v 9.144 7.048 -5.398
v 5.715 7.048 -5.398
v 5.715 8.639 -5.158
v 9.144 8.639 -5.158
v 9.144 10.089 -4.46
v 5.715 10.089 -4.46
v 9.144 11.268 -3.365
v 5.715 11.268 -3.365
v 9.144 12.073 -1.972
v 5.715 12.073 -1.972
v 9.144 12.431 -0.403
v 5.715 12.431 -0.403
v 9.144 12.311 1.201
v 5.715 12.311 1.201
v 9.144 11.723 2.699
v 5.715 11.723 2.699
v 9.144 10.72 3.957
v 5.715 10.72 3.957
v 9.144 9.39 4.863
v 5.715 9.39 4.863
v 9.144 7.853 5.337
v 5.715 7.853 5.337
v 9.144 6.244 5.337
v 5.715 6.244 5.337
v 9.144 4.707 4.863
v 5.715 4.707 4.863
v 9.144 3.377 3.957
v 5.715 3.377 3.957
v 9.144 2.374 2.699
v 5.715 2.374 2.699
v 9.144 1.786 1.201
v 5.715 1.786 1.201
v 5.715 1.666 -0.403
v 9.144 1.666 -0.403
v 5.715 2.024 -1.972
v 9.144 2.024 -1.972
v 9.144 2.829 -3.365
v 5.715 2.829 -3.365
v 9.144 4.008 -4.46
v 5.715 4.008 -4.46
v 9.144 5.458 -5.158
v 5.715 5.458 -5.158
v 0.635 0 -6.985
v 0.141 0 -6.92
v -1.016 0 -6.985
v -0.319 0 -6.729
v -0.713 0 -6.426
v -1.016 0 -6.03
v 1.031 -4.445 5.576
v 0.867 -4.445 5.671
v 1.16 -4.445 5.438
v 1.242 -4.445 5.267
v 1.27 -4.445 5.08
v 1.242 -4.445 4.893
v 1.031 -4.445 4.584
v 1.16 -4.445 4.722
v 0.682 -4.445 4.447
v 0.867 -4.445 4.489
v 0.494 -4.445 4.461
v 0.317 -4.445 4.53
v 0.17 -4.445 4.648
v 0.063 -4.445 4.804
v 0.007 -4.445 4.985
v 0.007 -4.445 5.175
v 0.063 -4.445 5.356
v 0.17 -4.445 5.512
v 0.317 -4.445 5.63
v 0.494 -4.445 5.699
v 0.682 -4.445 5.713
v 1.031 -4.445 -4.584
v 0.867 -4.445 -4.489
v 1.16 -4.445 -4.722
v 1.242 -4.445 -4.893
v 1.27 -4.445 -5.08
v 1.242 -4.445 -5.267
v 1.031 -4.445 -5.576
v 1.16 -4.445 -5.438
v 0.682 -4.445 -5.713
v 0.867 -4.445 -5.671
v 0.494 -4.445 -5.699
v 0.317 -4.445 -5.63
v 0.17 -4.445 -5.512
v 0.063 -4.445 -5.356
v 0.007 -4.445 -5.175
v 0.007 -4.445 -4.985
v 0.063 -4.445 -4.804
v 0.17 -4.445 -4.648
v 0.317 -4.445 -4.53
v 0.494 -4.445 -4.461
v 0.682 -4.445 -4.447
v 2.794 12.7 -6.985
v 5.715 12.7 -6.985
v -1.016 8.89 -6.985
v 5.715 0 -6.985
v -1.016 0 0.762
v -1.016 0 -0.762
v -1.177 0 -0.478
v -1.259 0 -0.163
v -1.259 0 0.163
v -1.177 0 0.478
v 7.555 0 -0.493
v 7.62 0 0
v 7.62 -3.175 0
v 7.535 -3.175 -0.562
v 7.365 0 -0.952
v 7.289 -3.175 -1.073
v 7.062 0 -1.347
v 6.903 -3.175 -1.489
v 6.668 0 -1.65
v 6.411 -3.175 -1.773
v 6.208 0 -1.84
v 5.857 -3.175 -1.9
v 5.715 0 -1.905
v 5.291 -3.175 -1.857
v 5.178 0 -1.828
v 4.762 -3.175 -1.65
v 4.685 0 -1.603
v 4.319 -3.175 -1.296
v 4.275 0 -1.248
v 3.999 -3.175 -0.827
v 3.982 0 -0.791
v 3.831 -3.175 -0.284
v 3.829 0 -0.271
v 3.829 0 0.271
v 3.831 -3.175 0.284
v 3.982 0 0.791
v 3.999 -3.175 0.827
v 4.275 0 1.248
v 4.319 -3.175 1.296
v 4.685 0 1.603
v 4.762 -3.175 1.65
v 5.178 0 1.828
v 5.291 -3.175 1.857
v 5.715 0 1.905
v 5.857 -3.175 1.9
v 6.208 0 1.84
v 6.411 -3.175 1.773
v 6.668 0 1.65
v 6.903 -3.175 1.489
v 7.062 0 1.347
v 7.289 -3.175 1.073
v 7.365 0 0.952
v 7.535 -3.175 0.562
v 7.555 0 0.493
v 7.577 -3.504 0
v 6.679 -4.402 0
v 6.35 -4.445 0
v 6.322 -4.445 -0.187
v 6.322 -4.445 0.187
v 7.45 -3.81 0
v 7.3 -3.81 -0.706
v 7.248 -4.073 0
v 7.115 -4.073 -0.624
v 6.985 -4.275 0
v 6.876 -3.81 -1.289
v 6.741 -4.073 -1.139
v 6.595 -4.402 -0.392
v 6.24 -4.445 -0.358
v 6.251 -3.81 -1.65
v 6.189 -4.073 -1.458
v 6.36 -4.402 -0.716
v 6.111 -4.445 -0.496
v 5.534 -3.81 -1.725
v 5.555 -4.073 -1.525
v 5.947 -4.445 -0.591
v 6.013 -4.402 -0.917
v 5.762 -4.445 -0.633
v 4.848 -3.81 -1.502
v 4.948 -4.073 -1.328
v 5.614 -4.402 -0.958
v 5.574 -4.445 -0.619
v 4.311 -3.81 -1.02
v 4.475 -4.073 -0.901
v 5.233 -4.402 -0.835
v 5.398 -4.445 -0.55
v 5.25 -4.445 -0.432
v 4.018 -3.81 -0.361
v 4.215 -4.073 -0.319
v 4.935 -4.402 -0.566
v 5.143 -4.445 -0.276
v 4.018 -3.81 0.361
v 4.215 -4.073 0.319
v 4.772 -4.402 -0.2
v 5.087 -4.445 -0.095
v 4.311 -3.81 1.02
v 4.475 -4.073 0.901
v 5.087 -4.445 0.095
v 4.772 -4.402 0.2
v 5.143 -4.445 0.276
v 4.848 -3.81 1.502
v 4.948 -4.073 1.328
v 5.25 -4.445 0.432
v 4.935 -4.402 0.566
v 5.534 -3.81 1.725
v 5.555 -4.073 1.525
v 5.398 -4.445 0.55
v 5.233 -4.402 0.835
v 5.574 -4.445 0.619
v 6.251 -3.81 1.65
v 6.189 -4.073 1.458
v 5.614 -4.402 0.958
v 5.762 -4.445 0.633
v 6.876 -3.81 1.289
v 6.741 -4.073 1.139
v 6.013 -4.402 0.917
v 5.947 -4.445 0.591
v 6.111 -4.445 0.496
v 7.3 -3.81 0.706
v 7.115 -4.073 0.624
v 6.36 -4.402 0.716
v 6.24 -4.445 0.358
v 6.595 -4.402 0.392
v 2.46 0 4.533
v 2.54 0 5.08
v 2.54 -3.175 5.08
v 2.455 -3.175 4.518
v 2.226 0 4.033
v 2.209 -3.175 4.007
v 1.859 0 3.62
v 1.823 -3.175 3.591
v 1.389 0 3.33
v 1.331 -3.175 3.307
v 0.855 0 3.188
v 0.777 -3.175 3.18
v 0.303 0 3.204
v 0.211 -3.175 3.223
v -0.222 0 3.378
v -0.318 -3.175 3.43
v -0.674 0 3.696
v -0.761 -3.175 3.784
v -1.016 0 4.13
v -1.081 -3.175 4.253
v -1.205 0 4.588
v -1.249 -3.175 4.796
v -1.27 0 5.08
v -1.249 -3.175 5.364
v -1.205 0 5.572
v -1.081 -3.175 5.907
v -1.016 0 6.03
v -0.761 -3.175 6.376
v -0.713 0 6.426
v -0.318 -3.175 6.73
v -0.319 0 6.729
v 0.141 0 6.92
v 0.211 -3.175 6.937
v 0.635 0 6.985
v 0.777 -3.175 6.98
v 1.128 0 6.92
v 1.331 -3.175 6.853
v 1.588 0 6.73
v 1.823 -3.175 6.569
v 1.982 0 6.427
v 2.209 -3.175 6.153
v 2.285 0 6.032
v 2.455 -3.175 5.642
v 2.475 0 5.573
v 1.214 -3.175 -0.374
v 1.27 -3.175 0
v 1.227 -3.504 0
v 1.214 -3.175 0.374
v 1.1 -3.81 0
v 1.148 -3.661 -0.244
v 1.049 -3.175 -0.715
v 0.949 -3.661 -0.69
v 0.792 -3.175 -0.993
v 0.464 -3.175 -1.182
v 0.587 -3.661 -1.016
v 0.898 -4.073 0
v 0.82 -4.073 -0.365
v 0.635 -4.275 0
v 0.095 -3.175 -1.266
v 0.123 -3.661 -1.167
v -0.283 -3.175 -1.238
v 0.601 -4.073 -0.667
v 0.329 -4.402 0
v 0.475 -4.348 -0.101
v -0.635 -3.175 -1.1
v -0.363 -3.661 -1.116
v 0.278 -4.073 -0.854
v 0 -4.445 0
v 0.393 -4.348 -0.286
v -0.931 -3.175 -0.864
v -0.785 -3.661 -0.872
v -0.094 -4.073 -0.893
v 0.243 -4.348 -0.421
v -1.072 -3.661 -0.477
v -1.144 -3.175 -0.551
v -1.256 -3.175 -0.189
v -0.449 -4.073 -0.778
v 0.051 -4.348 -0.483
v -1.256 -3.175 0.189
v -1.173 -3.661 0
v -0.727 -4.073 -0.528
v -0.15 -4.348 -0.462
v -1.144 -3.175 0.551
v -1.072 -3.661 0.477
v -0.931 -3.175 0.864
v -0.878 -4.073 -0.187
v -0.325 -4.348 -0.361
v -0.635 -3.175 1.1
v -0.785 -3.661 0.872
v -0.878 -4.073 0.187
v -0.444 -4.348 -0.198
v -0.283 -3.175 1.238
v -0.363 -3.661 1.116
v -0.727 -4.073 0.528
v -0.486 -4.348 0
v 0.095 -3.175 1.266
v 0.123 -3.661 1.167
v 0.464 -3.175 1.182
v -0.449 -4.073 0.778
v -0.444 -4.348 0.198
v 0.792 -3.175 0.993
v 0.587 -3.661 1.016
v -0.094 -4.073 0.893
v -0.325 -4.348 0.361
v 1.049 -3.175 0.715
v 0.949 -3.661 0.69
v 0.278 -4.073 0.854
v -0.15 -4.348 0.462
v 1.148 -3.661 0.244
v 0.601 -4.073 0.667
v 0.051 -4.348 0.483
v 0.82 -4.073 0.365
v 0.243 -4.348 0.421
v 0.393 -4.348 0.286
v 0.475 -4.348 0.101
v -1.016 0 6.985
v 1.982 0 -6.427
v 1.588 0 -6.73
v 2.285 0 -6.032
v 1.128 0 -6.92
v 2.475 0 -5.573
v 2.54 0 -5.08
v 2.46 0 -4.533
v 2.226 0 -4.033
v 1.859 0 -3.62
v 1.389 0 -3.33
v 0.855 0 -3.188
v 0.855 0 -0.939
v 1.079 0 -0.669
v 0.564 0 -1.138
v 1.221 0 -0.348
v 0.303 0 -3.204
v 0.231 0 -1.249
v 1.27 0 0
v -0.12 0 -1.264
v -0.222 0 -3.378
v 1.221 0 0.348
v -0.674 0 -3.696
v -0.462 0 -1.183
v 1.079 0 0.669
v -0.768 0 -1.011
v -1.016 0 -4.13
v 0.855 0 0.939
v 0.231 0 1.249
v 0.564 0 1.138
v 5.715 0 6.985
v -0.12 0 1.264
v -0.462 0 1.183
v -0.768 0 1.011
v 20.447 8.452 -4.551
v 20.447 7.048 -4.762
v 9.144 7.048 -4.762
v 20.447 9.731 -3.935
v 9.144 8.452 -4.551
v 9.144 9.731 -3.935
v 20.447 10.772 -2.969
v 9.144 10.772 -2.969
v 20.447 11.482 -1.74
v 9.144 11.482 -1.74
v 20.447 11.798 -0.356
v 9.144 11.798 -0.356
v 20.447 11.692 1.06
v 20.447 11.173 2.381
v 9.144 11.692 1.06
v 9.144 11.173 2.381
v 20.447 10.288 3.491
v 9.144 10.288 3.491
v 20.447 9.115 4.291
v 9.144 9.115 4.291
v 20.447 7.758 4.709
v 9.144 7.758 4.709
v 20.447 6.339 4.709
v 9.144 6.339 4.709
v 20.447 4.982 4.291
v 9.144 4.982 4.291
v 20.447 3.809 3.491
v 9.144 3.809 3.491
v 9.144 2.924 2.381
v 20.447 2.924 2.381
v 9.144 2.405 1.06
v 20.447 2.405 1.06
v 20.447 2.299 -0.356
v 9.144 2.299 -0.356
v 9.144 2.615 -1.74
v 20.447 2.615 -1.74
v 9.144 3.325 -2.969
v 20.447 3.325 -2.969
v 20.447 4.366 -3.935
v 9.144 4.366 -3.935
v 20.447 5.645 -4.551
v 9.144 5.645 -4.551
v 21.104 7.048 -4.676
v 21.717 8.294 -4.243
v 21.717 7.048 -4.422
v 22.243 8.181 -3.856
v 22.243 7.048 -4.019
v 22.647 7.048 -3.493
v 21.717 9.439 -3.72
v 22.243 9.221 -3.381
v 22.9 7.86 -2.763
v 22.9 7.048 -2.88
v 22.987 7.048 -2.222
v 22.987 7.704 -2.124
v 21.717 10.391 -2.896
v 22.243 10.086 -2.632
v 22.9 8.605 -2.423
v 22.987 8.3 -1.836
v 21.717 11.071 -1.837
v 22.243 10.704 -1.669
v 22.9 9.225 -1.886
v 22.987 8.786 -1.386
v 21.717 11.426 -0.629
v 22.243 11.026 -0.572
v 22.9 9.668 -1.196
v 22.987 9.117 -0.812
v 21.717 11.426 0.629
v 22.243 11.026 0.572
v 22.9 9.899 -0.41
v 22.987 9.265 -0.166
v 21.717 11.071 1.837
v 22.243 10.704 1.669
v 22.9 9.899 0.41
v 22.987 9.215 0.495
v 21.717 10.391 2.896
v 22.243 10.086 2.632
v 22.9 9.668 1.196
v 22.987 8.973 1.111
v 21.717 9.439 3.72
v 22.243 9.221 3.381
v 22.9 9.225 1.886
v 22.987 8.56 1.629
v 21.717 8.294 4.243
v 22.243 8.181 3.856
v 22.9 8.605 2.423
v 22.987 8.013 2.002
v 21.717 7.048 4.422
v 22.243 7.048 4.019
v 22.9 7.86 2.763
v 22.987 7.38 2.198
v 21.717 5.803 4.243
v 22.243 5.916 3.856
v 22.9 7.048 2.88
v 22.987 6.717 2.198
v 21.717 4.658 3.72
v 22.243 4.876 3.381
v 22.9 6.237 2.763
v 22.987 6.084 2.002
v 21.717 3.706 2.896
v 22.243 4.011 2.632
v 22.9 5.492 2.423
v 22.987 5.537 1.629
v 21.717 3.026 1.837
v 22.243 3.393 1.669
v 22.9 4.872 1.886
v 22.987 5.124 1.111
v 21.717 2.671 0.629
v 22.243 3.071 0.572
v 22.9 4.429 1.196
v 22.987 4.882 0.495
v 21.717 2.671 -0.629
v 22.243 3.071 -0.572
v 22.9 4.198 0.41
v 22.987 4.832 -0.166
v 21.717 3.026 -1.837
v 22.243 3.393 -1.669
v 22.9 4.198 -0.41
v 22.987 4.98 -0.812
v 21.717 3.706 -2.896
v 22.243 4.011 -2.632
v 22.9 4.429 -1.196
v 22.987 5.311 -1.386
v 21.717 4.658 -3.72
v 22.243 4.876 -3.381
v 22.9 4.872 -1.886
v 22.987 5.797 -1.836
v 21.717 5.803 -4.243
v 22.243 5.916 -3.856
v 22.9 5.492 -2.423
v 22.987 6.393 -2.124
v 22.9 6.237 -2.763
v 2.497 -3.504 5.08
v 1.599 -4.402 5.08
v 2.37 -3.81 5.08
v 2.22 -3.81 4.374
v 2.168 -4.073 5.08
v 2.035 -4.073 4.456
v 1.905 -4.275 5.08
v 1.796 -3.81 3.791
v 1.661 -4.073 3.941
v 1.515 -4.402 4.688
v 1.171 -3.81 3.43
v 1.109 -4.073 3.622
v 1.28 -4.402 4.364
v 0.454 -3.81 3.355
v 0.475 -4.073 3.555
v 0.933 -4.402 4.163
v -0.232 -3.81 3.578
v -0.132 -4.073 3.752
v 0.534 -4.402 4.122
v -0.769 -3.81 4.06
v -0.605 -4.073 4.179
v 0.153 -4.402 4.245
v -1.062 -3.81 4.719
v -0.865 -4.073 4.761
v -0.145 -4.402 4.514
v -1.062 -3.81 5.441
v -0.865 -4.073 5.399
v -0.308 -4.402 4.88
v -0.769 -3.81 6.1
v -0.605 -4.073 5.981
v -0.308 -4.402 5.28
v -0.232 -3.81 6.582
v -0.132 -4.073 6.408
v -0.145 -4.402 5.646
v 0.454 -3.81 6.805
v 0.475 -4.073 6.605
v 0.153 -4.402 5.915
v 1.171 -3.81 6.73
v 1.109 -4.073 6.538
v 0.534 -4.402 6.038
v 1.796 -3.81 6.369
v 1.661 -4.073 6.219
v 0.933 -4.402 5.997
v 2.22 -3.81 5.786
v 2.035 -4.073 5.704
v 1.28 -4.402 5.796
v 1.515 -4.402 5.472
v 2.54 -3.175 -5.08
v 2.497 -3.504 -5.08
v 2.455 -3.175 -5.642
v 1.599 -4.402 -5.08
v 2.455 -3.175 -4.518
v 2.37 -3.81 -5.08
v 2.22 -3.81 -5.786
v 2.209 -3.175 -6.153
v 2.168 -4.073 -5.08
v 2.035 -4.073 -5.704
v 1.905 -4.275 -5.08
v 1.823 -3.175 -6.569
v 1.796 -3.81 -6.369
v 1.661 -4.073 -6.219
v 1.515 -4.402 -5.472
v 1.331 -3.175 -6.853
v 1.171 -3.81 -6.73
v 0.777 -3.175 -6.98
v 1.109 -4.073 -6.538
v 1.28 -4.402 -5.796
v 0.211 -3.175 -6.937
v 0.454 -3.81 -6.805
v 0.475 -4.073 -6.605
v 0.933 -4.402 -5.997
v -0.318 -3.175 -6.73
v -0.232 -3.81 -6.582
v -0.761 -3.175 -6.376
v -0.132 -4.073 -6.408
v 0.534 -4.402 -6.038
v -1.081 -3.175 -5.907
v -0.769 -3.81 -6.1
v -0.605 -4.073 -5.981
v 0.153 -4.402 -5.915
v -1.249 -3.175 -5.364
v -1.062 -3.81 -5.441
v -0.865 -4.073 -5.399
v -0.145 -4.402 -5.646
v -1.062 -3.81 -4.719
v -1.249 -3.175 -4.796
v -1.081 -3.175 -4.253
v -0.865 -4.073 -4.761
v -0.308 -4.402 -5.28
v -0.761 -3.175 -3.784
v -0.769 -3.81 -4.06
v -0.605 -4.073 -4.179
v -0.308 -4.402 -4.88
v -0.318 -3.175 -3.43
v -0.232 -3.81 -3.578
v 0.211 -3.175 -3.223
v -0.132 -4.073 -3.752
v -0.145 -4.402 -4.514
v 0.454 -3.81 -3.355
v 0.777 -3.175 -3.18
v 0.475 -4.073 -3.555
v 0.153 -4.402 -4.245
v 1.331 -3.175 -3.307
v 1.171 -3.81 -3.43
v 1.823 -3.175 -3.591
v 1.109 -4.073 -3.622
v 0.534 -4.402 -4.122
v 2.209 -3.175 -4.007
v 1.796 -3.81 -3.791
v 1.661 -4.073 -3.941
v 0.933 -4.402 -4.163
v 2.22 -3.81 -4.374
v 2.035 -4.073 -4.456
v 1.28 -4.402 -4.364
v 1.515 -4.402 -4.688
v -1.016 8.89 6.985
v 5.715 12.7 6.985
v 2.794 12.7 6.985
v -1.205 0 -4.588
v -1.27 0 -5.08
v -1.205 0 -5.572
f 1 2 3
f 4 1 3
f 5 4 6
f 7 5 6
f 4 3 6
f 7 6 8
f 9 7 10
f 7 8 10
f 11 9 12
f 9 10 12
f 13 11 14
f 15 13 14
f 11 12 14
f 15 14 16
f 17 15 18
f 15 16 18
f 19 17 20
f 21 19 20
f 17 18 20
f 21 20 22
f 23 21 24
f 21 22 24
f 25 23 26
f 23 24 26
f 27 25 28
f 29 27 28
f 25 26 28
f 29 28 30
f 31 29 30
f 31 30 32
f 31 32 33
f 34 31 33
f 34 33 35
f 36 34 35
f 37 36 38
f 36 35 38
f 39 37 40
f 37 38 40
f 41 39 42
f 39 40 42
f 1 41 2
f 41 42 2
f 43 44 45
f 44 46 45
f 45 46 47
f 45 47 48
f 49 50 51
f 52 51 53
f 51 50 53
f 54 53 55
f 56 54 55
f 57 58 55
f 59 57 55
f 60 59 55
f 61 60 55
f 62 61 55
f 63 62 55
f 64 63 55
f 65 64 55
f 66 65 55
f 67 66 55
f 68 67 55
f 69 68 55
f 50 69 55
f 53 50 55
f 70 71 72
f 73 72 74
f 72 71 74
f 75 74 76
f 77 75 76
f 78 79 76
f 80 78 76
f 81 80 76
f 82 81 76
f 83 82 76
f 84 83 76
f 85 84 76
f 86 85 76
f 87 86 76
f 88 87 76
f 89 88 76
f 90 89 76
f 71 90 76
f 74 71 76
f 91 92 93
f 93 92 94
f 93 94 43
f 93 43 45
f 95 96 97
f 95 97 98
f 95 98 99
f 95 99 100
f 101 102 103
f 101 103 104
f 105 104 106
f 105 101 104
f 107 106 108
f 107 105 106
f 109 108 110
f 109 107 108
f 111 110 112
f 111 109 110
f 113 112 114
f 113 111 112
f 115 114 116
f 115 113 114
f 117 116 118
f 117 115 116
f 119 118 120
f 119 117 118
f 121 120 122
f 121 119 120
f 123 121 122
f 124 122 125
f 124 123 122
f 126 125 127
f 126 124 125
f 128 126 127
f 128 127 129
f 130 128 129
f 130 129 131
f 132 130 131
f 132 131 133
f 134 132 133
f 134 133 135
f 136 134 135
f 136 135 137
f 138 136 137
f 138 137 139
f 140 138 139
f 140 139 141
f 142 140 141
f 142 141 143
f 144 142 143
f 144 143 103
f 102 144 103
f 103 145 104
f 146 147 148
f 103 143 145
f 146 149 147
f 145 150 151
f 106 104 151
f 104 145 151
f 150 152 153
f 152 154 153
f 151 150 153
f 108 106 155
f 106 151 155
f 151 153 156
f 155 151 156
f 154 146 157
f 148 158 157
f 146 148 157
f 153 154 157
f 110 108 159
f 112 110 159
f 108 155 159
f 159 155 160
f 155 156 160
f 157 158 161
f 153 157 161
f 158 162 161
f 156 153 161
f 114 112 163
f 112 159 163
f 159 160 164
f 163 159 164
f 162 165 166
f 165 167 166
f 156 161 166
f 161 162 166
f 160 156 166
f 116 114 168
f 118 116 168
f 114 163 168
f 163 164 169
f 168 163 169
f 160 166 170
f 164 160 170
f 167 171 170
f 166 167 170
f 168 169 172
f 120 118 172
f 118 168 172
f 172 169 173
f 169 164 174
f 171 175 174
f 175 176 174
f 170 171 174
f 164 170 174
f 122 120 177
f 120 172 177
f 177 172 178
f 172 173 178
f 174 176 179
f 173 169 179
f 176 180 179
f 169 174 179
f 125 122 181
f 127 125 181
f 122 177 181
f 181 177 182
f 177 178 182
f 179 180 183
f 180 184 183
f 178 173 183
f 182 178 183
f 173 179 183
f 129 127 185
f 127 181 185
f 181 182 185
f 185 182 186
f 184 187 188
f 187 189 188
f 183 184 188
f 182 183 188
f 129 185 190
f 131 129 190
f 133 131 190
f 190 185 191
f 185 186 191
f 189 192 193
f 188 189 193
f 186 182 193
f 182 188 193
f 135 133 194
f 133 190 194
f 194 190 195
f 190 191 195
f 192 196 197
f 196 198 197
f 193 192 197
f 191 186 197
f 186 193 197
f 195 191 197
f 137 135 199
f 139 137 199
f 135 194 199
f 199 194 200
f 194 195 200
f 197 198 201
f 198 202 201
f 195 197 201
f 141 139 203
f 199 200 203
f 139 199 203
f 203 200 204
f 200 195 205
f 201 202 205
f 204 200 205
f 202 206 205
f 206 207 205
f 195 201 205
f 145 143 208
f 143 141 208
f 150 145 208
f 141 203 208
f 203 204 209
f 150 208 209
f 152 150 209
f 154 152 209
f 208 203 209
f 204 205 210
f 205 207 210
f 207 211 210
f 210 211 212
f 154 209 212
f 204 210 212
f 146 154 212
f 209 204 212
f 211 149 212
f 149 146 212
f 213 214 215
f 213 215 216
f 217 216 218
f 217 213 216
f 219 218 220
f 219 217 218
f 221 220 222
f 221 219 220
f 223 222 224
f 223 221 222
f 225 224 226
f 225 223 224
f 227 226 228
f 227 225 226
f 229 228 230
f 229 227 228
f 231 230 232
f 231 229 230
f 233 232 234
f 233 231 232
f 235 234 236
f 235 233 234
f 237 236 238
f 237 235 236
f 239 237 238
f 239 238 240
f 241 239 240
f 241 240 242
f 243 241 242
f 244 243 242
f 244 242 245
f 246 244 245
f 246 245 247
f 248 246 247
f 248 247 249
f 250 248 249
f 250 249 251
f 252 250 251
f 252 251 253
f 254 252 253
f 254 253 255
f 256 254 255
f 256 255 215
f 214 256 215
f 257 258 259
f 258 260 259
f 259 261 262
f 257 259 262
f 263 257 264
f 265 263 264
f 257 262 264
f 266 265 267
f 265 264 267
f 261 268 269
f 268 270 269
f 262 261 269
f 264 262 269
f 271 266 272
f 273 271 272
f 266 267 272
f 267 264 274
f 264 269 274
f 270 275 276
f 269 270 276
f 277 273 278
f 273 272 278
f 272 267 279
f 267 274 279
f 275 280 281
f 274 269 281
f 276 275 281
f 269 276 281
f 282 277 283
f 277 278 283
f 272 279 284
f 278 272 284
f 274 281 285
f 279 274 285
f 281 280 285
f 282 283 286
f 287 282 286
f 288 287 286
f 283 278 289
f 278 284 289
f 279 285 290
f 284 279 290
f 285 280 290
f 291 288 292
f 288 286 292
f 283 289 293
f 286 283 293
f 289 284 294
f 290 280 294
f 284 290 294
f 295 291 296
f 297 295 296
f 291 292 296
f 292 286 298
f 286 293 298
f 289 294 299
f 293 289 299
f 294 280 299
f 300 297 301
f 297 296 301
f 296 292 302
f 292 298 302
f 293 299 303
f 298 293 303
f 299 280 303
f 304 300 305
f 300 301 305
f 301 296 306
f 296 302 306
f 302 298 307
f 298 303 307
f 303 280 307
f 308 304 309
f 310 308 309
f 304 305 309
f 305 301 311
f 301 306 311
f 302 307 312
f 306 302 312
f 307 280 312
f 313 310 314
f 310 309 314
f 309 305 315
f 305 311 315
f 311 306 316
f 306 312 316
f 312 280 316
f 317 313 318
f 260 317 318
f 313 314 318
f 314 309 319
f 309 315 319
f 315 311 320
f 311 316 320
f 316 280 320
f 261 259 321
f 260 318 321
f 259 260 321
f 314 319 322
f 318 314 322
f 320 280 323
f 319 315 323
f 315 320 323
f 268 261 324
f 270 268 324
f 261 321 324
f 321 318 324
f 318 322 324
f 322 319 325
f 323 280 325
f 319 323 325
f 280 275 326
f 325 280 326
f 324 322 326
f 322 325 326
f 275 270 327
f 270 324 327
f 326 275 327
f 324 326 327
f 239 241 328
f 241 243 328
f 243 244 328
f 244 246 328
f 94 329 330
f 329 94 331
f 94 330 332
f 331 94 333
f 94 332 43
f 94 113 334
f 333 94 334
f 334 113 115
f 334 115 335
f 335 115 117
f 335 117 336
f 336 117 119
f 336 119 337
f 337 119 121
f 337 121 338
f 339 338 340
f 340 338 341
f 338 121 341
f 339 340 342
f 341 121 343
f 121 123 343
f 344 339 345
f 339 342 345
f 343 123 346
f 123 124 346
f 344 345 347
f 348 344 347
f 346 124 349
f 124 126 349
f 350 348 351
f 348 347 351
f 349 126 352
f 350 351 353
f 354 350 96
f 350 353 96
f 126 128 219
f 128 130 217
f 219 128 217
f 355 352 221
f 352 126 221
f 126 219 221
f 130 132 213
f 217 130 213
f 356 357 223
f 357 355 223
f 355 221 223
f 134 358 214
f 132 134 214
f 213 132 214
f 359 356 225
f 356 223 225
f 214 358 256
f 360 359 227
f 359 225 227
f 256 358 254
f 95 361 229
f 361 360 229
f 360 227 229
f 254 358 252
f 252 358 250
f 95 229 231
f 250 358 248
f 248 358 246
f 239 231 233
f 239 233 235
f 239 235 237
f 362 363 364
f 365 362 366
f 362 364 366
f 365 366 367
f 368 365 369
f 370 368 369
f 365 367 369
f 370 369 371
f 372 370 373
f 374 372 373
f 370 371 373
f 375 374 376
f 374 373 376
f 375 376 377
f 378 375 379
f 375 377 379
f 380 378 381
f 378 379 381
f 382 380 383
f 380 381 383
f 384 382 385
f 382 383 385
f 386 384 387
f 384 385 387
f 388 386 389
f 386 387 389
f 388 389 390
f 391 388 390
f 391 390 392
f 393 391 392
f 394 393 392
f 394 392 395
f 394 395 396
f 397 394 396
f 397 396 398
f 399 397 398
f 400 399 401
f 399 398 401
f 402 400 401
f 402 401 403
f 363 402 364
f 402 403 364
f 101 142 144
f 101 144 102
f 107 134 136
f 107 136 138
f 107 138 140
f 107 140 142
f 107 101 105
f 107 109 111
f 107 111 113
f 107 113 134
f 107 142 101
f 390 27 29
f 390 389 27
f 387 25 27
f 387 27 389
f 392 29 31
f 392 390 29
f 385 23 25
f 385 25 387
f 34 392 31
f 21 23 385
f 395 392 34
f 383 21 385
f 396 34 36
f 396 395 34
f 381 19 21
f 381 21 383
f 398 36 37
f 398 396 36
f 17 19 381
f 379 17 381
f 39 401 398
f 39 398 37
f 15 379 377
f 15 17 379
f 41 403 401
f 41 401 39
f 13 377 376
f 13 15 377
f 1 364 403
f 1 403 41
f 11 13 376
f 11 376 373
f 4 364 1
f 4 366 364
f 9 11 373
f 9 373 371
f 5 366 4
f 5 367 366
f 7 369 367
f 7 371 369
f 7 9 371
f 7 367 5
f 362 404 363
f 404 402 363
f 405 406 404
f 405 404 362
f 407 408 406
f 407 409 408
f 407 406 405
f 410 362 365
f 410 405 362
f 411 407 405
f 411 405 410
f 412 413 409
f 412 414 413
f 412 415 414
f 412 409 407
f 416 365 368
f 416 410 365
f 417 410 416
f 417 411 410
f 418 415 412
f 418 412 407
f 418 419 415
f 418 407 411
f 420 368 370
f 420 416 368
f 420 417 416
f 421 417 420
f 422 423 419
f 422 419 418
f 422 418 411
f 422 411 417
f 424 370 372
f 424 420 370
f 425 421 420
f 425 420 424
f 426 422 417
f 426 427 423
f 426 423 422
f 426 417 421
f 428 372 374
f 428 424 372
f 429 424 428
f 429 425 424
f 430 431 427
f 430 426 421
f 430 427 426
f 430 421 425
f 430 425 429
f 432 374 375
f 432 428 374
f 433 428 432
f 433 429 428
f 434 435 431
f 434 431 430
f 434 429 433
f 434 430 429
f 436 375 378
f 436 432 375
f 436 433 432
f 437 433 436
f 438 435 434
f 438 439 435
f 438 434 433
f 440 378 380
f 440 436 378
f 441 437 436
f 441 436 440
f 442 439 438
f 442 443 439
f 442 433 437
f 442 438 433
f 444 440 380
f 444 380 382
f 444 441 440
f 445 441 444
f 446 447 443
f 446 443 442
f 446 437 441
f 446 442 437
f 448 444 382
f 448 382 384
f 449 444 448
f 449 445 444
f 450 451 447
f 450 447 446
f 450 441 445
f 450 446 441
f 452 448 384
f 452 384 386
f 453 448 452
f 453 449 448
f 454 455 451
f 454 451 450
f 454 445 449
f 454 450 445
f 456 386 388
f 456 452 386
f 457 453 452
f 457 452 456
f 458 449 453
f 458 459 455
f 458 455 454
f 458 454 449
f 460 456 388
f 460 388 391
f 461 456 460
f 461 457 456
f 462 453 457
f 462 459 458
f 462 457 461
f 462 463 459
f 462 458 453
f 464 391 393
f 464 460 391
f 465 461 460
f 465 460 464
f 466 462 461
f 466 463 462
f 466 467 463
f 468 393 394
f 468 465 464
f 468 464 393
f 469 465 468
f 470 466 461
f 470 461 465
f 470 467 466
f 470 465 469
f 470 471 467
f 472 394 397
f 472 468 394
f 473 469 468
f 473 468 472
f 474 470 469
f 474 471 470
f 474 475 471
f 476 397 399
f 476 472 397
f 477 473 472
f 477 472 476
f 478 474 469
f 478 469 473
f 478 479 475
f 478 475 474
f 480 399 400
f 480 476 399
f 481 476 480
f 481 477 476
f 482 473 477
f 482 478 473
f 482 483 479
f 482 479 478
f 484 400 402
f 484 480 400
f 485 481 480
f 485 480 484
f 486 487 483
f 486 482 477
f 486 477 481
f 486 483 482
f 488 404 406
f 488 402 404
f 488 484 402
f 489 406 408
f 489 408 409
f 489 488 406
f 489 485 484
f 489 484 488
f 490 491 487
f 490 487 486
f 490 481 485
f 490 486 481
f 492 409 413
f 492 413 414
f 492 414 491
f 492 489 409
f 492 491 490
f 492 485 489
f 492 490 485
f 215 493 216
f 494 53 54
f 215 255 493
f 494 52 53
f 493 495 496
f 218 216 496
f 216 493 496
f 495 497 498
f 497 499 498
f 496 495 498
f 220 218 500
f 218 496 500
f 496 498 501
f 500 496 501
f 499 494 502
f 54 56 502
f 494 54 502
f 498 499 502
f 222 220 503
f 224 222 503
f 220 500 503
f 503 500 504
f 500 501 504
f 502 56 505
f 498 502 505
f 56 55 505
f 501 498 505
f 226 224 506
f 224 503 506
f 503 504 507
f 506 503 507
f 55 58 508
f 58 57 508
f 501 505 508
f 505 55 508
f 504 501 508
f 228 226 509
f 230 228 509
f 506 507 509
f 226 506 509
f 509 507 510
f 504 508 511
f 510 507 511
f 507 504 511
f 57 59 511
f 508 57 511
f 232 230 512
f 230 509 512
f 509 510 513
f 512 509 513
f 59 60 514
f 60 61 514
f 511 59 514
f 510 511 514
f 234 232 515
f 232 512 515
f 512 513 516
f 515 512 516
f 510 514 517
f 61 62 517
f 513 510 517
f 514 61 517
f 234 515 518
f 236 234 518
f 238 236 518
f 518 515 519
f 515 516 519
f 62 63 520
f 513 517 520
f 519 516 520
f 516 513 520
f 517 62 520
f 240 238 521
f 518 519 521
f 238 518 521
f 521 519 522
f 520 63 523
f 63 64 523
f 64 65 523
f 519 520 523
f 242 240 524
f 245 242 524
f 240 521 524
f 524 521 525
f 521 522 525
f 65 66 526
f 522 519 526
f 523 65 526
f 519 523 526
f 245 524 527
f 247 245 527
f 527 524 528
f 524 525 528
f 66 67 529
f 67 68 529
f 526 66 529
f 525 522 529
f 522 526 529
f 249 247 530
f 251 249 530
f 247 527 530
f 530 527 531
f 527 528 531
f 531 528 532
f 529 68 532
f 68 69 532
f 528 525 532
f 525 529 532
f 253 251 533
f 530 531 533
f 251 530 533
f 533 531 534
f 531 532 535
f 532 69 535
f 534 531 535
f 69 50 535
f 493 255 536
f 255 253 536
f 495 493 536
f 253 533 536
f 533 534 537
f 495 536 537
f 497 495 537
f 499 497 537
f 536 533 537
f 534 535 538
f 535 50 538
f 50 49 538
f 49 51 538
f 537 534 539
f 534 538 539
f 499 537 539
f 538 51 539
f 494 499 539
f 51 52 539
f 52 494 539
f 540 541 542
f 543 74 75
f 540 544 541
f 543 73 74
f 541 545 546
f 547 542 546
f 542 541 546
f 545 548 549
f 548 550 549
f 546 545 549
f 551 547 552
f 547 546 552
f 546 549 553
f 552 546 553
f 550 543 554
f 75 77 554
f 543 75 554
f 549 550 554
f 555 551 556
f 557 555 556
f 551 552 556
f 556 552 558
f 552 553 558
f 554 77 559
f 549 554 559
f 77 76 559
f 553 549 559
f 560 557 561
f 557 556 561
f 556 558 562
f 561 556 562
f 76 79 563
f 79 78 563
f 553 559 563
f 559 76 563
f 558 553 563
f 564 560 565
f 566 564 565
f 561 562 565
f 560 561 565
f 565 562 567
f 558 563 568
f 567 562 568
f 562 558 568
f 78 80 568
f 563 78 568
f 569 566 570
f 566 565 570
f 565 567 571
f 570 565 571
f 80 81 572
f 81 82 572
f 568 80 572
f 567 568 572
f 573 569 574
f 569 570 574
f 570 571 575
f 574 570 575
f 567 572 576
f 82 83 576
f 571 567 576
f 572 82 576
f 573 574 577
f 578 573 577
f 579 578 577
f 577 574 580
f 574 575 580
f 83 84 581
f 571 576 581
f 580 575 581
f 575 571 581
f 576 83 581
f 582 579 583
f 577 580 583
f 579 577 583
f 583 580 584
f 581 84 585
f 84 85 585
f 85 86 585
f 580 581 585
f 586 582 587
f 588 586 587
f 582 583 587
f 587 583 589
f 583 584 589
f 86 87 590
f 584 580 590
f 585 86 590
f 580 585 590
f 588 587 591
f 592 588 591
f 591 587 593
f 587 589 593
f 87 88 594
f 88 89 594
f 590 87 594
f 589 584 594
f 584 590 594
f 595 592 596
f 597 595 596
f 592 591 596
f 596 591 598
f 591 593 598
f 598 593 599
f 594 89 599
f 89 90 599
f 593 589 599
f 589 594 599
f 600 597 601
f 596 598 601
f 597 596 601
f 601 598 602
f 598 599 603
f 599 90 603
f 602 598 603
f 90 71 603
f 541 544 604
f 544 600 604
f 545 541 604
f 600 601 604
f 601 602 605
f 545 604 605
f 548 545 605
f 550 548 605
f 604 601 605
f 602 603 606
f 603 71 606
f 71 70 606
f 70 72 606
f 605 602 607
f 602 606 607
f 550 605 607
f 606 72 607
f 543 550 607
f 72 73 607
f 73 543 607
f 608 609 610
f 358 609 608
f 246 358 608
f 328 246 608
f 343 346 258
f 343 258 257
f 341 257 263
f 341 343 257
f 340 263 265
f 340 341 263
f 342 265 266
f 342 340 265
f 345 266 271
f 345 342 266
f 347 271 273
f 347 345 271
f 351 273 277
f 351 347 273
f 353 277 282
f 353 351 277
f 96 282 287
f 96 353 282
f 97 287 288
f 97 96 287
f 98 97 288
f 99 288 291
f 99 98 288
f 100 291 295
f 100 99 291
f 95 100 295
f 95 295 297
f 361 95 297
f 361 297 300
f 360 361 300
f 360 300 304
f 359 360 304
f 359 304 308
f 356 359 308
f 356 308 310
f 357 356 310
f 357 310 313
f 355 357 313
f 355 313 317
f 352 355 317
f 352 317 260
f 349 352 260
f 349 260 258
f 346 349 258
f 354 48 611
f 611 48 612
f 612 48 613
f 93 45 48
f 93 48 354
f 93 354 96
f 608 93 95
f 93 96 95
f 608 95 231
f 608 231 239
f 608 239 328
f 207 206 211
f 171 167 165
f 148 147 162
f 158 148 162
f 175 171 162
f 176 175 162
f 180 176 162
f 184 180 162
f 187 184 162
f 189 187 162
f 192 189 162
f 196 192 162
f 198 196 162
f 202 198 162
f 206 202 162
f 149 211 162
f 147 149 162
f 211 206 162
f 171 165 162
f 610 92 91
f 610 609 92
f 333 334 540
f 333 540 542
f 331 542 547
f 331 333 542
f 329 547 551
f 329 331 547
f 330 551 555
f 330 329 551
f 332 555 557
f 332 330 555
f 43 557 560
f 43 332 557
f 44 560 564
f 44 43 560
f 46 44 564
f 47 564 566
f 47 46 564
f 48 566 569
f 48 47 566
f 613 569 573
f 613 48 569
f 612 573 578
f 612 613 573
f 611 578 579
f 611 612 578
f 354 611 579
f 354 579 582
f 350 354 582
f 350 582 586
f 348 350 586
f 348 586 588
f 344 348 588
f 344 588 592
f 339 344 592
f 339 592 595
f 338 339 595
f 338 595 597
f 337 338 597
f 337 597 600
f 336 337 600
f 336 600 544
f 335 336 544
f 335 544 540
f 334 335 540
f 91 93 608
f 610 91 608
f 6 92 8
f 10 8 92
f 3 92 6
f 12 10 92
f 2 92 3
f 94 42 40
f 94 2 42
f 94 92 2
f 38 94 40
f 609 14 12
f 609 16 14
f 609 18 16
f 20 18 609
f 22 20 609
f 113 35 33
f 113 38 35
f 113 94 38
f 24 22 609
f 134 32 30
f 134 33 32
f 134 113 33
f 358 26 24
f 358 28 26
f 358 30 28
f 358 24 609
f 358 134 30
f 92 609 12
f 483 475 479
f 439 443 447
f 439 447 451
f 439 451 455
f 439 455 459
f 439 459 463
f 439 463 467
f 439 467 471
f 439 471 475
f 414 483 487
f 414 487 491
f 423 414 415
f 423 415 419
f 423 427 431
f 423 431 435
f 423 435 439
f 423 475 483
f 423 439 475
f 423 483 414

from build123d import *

# Parameters (mm, degrees)
SKETCH1_R             = 1.905
BOSS_EXTRUDE1_DEPTH   = 4.445
BOSS_EXTRUDE1_2_DEPTH = 4.445
BOSS_EXTRUDE1_3_DEPTH = 4.445
SKETCH1_R_2           = 1.27
BOSS_EXTRUDE1_4_DEPTH = 4.445
SKETCH2_W             = 6.731
SKETCH2_H             = 13.97
BOSS_EXTRUDE2_DEPTH   = 12.7
CHAMFER1_SIZE         = 3.81
SKETCH3_R             = 5.3975
BOSS_EXTRUDE3_DEPTH   = 3.429
SKETCH4_R             = 4.7625
BOSS_EXTRUDE4_DEPTH   = 13.843
FILLET1_R             = 2.54
FILLET2_R             = 1.27


with BuildPart() as part:
    # Sketch1 → Boss-Extrude1 (new body)
    with BuildSketch(Plane(origin=(0, 0, 0), x_dir=(1, 0, 0), z_dir=(0, 1, 0))):
        with Locations((0.635, 5.08)):
            Circle(SKETCH1_R)
    extrude(amount=-BOSS_EXTRUDE1_DEPTH)



with BuildPart() as body_2:
    # Sketch1 → Boss-Extrude1 2 (new body)
    with BuildSketch(Plane(origin=(0, 0, 0), x_dir=(1, 0, 0), z_dir=(0, 1, 0))):
        with Locations((0.635, -5.08)):
            Circle(SKETCH1_R)
    extrude(amount=-BOSS_EXTRUDE1_2_DEPTH)


with BuildPart() as body_3:
    # Sketch1 → Boss-Extrude1 3 (new body)
    with BuildSketch(Plane(origin=(0, 0, 0), x_dir=(1, 0, 0), z_dir=(0, 1, 0))):
        with Locations((5.715, 0)):
            Circle(SKETCH1_R)
    extrude(amount=-BOSS_EXTRUDE1_3_DEPTH)


with BuildPart() as body_4:
    # Sketch1 → Boss-Extrude1 4 (new body)
    with BuildSketch(Plane(origin=(0, 0, 0), x_dir=(1, 0, 0), z_dir=(0, 1, 0))):
        Circle(SKETCH1_R_2)
    extrude(amount=-BOSS_EXTRUDE1_4_DEPTH)


with BuildPart() as part_1:
    add(part.part)

    add(body_2.part)  # Boss-Extrude2 merges body 2

    add(body_3.part)  # Boss-Extrude2 merges body 3

    add(body_4.part)  # Boss-Extrude2 merges body 4
    # Sketch2 → Boss-Extrude2 (add)
    with BuildSketch(Plane(origin=(0, 0, 0), x_dir=(-1, 0, 0), z_dir=(0, 1, 0))):
        with Locations((-2.3495, 0)):
            Rectangle(SKETCH2_W, SKETCH2_H)
    extrude(amount=BOSS_EXTRUDE2_DEPTH)

    # Chamfer1
    chamfer1_edges = [part_1.edges().sort_by_distance(p)[0] for p in [
        (-1.016, 12.7, 0),
    ]]
    chamfer(chamfer1_edges, length=CHAMFER1_SIZE)

    # Sketch3 → Boss-Extrude3 (add)
    with BuildSketch(Plane(origin=(5.715, 0, 0), x_dir=(0, 0, -1), z_dir=(1, 0, 0))):
        with Locations((0, 7.0485)):
            Circle(SKETCH3_R)
    extrude(amount=BOSS_EXTRUDE3_DEPTH)

    # Sketch4 → Boss-Extrude4 (add)
    with BuildSketch(Plane(origin=(9.144, 0, 0), x_dir=(0, 0, -1), z_dir=(1, 0, 0))):
        with Locations((0, 7.0485)):
            Circle(SKETCH4_R)
    extrude(amount=BOSS_EXTRUDE4_DEPTH)

    # Fillet1
    fillet1_edges = [part_1.edges().sort_by_distance(p)[0] for p in [
        (22.987, 7.0485, 4.7625),
    ]]
    fillet(fillet1_edges, radius=FILLET1_R)

    # Fillet2
    fillet2_edges = [part_1.edges().sort_by_distance(p)[0] for p in [
        (-1.27, -4.445, 5.08),
        (3.81, -4.445, 0),
        (-1.27, -4.445, 0),
        (-1.27, -4.445, -5.08),
    ]]
    fillet(fillet2_edges, radius=FILLET2_R)


solid = part_1.part
